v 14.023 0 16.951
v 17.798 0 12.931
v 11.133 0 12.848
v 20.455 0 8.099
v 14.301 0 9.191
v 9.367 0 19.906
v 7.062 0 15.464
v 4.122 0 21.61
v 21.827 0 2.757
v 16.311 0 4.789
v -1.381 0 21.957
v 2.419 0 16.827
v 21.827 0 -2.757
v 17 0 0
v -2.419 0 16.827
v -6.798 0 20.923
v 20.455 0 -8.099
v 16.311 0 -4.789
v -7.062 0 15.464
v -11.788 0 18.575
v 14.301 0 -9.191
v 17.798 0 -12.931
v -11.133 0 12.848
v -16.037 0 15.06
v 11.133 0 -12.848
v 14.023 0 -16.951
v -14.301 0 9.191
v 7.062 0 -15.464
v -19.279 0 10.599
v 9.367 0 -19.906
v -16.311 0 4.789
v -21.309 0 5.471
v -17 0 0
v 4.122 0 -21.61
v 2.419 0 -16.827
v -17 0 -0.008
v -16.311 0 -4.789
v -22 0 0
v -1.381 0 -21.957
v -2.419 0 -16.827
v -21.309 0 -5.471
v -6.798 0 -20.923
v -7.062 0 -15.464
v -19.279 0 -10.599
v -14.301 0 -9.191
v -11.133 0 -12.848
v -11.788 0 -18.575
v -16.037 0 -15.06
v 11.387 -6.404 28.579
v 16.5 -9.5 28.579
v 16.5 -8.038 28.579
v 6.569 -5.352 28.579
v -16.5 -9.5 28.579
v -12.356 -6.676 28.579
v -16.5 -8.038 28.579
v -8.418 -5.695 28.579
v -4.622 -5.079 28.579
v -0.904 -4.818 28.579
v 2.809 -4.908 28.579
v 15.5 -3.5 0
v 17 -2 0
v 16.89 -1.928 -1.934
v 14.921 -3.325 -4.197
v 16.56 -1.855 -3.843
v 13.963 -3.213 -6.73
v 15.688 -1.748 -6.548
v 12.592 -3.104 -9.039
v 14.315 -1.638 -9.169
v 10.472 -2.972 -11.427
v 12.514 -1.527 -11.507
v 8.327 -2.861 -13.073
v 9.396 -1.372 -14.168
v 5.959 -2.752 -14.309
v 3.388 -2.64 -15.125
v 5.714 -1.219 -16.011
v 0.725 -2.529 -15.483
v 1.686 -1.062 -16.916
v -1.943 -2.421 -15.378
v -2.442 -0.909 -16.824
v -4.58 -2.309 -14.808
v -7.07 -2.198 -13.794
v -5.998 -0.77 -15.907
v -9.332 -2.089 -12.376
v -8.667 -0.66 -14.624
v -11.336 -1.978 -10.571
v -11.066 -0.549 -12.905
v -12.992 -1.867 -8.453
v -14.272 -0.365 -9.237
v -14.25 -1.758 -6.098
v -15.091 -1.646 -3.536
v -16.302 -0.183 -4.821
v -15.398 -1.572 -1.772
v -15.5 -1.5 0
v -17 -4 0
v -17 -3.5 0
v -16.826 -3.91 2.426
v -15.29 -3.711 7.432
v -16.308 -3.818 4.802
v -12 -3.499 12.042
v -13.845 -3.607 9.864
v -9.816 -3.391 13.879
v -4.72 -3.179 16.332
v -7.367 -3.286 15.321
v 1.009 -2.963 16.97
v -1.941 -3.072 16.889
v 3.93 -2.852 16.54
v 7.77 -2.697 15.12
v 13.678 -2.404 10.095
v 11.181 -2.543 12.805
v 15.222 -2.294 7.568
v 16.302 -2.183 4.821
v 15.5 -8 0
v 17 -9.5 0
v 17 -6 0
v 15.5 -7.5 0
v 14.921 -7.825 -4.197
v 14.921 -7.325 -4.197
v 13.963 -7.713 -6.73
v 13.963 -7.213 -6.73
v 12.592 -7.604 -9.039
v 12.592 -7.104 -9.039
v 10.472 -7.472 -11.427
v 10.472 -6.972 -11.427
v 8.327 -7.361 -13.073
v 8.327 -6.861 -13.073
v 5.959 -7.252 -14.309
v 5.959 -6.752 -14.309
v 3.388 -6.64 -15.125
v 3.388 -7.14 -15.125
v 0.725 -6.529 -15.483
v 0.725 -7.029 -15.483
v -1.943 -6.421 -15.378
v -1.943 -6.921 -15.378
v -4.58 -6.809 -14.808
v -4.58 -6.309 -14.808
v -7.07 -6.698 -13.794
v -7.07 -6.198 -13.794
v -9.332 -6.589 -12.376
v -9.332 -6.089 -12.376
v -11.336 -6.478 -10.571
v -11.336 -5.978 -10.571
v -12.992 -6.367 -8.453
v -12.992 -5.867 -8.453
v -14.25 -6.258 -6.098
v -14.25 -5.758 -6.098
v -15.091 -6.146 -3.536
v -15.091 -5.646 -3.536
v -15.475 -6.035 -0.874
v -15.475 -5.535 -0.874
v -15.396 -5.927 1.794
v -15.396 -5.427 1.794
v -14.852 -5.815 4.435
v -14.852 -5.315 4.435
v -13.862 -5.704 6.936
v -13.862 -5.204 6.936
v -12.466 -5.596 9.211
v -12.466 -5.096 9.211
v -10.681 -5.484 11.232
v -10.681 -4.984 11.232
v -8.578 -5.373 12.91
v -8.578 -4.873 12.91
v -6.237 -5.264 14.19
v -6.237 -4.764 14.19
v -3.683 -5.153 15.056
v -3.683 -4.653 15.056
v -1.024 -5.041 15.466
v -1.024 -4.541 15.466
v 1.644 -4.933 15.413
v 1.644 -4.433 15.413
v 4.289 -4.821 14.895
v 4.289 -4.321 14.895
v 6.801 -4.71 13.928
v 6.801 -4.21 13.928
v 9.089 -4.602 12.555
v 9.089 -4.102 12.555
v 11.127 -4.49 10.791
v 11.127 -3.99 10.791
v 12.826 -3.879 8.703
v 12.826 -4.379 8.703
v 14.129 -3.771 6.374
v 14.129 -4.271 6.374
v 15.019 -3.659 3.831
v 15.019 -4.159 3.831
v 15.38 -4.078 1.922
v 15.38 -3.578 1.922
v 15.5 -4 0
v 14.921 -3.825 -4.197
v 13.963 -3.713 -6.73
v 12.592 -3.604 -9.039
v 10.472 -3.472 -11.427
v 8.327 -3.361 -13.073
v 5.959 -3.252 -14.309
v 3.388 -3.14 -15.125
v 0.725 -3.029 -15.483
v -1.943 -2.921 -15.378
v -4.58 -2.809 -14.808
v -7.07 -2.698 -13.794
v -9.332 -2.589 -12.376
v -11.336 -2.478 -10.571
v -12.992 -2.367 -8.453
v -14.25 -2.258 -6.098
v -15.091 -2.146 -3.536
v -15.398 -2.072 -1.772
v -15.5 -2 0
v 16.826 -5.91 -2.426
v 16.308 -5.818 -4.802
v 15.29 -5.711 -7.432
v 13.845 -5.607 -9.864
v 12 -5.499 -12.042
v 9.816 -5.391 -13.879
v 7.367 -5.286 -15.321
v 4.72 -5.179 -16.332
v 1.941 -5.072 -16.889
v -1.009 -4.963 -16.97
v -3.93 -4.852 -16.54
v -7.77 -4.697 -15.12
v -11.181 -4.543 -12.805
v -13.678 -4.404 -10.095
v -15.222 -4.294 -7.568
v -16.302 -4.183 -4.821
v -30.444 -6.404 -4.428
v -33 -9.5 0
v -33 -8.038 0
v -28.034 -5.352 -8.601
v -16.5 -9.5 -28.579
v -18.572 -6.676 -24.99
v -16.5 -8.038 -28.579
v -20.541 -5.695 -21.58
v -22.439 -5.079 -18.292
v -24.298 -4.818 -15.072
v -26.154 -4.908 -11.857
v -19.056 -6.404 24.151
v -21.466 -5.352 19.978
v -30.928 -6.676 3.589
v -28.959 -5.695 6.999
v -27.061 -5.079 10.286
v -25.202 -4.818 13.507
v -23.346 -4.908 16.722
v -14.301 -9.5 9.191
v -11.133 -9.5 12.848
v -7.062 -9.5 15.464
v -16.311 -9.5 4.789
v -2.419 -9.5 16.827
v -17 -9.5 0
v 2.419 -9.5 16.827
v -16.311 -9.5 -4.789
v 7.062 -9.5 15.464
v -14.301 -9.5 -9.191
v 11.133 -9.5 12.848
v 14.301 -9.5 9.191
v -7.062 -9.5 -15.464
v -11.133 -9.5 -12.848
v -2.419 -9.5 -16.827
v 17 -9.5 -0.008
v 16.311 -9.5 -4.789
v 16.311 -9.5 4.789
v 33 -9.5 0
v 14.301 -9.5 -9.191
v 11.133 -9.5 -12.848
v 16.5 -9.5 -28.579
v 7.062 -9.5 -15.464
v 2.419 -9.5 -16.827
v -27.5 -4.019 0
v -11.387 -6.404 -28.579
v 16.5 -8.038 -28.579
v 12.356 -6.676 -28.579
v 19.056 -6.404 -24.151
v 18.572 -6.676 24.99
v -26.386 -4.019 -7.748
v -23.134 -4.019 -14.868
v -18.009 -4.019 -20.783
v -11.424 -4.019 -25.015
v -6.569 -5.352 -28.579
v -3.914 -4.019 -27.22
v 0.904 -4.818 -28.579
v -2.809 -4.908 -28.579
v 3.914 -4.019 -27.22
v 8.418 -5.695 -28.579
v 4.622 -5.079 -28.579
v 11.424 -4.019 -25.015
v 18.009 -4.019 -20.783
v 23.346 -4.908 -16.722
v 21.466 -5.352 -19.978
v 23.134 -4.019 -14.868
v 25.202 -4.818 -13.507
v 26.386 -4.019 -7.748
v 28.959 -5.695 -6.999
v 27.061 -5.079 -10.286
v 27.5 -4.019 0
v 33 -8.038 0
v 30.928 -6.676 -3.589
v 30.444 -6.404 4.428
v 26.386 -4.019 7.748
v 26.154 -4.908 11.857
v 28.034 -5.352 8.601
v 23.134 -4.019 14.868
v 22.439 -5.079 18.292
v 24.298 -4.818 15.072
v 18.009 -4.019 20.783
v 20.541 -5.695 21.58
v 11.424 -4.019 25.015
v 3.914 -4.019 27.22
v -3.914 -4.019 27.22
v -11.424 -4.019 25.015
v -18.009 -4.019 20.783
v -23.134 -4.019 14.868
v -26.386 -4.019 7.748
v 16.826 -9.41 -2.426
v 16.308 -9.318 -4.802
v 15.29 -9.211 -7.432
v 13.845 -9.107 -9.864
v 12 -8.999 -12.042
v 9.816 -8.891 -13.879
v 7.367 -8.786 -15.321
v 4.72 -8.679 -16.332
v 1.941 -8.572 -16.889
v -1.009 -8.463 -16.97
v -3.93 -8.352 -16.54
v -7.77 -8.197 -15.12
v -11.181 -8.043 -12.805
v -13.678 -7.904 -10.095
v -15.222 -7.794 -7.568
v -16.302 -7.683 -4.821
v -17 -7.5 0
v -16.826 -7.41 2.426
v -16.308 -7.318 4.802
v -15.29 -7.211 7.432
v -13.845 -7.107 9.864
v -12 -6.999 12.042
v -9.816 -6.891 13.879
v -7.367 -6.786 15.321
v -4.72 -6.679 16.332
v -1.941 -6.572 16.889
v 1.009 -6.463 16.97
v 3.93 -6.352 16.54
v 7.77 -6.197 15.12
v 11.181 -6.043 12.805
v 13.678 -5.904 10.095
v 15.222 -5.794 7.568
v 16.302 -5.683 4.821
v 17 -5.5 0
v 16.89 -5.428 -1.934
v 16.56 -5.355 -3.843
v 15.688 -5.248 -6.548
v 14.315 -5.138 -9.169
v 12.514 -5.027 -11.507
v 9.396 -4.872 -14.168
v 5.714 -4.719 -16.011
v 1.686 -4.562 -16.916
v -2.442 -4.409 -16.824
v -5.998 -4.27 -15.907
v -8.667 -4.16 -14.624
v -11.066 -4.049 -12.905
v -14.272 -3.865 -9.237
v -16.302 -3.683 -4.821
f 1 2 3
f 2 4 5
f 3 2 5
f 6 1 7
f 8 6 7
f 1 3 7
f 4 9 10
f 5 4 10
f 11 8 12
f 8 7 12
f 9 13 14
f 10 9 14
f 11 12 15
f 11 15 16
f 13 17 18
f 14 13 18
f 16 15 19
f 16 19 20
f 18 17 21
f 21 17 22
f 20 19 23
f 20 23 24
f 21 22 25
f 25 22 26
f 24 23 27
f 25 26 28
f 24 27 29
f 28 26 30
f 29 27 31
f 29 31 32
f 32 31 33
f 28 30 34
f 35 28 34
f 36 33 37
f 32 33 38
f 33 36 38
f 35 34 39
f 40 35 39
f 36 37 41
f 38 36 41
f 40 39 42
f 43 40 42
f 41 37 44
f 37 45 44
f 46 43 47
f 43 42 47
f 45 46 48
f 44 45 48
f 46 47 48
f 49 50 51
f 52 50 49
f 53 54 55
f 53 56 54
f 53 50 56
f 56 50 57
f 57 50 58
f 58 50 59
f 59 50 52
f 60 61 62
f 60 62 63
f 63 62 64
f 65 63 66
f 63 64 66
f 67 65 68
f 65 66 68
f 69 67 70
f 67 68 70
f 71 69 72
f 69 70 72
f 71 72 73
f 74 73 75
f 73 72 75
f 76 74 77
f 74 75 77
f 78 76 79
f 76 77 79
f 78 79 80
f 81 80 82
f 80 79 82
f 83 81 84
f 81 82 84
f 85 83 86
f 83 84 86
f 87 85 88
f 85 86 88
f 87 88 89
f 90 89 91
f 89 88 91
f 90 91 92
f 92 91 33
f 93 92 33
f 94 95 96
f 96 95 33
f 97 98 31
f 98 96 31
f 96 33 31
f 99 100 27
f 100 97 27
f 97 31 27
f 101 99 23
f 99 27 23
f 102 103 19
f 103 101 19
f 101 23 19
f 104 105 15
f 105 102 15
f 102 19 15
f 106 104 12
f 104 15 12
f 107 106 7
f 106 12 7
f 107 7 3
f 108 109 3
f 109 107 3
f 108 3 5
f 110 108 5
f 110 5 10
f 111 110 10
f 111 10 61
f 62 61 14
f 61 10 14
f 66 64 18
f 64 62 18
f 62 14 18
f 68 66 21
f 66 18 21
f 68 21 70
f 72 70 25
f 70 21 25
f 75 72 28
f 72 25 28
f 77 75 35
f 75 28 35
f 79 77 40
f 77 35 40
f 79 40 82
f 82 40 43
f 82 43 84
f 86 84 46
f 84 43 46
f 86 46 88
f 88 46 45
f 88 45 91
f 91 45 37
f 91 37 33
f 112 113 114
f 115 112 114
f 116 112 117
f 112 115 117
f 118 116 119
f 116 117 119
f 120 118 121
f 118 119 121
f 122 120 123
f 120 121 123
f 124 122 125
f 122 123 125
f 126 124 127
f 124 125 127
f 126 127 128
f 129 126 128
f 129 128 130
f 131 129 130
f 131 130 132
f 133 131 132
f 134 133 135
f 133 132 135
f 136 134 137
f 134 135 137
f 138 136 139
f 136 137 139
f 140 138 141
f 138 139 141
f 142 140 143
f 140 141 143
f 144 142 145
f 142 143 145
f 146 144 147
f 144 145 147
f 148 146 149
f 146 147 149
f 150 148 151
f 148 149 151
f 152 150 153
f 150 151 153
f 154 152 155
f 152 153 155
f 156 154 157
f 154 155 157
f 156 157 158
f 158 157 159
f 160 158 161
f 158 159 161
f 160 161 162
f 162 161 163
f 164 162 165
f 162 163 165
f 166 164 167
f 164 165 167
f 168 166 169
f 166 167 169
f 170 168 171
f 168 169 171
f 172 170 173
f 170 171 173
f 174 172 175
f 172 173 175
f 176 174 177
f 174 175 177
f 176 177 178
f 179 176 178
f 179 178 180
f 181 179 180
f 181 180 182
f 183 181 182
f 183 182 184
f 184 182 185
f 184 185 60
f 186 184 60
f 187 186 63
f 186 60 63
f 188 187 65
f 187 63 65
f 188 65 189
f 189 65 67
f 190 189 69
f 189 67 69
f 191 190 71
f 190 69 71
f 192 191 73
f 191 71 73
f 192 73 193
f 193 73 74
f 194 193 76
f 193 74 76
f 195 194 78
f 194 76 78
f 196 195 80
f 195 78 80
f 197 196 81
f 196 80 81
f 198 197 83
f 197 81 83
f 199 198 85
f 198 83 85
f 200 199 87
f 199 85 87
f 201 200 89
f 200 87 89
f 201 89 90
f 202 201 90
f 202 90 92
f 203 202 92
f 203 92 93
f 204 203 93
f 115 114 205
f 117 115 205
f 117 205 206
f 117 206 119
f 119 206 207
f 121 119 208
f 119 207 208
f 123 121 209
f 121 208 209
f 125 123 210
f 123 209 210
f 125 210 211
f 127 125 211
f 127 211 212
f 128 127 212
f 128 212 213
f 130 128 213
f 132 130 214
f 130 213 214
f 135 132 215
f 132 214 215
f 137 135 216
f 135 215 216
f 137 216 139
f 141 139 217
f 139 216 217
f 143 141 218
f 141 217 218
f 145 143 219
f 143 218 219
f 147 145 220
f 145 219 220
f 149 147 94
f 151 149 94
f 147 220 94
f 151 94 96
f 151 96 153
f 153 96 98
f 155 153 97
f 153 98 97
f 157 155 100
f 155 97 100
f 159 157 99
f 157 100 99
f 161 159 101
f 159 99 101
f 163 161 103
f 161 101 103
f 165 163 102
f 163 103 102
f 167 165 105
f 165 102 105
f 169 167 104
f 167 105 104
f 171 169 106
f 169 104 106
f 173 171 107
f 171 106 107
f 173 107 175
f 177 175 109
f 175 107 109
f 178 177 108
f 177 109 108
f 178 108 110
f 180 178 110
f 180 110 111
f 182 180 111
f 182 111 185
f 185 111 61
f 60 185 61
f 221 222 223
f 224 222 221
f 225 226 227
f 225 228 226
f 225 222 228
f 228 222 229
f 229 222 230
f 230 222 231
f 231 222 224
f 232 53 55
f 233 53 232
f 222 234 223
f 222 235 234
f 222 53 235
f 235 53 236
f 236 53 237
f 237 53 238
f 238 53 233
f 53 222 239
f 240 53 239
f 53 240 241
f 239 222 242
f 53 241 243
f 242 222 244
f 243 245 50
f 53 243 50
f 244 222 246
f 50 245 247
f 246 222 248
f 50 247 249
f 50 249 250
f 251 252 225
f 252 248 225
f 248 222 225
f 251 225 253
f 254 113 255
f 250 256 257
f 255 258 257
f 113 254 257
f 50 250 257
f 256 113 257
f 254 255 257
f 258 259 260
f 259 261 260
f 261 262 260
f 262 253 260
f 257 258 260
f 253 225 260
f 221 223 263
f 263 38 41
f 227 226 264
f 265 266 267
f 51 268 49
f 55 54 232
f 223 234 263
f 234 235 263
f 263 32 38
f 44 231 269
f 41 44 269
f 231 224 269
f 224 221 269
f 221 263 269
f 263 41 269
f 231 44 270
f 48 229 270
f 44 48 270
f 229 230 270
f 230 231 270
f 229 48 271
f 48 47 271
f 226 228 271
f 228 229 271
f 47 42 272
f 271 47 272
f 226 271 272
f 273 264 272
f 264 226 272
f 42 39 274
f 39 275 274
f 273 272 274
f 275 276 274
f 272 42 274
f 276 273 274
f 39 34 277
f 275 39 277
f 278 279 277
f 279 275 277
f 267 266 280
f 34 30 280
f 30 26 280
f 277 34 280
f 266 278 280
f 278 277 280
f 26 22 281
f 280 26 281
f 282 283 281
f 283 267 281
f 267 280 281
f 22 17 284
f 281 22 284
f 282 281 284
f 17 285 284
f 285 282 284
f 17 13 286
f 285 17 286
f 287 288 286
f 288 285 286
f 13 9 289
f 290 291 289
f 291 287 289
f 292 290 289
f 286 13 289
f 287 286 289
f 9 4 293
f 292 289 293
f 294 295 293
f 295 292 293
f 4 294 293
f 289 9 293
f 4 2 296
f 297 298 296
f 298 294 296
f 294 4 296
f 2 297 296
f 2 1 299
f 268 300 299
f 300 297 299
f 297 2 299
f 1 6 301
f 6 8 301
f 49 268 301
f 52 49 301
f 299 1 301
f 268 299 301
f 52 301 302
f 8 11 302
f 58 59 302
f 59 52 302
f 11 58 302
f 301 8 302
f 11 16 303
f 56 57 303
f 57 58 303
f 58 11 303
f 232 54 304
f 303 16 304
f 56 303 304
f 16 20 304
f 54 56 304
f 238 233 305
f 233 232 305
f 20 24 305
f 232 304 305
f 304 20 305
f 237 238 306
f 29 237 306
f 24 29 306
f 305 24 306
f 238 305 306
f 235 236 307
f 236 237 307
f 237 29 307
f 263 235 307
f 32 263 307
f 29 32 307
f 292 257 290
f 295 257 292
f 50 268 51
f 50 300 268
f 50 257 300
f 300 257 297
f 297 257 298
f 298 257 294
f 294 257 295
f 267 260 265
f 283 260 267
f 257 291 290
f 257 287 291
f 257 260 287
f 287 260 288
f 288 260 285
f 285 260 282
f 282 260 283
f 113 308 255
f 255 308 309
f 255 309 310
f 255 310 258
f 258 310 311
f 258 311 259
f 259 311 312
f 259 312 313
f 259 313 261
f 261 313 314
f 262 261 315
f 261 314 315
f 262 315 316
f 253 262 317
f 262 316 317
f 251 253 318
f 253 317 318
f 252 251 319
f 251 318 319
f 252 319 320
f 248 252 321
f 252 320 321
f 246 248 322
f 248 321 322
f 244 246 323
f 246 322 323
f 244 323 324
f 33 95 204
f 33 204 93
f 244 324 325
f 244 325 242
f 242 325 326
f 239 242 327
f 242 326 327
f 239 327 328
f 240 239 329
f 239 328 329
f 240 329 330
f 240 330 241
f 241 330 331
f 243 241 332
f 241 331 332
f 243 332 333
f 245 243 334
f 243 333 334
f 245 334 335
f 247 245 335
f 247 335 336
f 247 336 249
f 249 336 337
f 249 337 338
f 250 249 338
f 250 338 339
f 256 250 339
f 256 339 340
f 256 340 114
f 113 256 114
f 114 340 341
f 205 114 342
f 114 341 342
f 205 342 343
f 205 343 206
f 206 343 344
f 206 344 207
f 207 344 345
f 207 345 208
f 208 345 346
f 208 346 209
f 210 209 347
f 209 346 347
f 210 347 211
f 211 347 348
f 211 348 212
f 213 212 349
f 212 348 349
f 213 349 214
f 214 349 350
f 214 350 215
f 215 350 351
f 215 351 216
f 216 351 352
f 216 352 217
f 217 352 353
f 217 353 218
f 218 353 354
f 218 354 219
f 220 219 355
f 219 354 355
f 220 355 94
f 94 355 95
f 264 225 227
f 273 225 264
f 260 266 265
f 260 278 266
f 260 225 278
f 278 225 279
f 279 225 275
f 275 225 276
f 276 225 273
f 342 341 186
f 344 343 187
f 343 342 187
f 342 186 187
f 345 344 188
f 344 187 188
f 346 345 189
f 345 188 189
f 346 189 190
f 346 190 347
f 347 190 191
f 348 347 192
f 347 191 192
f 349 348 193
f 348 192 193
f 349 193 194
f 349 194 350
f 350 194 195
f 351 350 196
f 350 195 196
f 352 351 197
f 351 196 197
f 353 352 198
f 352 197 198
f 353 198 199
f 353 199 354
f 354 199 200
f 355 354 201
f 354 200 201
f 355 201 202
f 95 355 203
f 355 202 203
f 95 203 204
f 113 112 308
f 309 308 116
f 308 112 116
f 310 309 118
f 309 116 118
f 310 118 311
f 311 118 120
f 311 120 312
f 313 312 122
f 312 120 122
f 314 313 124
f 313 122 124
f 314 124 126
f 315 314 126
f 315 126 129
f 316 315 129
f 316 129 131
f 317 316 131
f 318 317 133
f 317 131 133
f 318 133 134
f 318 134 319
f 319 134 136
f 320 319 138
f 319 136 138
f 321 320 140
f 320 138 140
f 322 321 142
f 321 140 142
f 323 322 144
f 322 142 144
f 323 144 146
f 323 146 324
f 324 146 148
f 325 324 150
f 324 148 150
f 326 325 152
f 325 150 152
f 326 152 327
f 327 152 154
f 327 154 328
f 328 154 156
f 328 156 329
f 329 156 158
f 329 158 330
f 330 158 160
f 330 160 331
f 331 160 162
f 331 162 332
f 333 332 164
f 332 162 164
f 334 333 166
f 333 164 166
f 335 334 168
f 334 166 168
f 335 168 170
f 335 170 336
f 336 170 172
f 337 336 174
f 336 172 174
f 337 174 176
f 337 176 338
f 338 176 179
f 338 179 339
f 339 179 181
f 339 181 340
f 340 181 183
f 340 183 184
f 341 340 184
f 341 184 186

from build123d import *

# Parameters (mm, degrees)
SKETCH_4_R          = 17
CUT_EXTRUDE_2_DEPTH = 10
SWEEP_1_PITCH       = 4
SKETCH_12_W         = 1
SKETCH_12_H         = 0.730769231
SKETCH_13_R         = 34
CUT_EXTRUDE_3_DEPTH = 10


with BuildPart() as part:
    # 草图1 → 旋转1 (revolve)
    with BuildSketch(Plane.XY):
        Polygon((0, 0), (0, -9.5), (-35, -9.5), (-22, 0), align=None)
    revolve(axis=Axis((0, 0, 0), (0, -1, 0)))

    # 草图4 → 切除-拉伸2 (cut)
    with BuildSketch(Plane(origin=(0, 0, 0), x_dir=(1, 0, 0), z_dir=(0, 1, 0))):
        with Locations(Location((0, 0, 0), (0, 0, 180))):
            Circle(SKETCH_4_R)
    extrude(amount=-CUT_EXTRUDE_2_DEPTH, mode=Mode.SUBTRACT)

    # 扫描1: the profile of 草图7 profile screwed along a right-hand helix of 1.5 turns, 12 arcs to a turn; built about Z, then put on its axis
    sweep_1_z = Axis((0, 0, 0), (0, 0, 1))
    sweep_1_corners = [(17.0003, 0, 1.7503), (17.0003, 0, -1.7503), (15.5, 0, -0.25), (15.5, 0, 0.25)]
    with BuildLine(mode=Mode.PRIVATE) as sweep_1_profile:
        Line(sweep_1_corners[0], sweep_1_corners[1])
        Line(sweep_1_corners[1], sweep_1_corners[2])
        Line(sweep_1_corners[2], sweep_1_corners[3])
        Line(sweep_1_corners[3], sweep_1_corners[0])
    sweep_1_cap = Face(sweep_1_profile.wire())
    sweep_1_turn_angles = [0, 15, 30, 45, 60, 75, 90, 105, 120, 135, 150, 165, 180, 195, 210, 225, 240, 255, 270, 285, 300, 315, 330, 345, 360]
    sweep_1_turn_weights = [1, 0.9659258262890683, 1, 0.9659258262890683, 1, 0.9659258262890683, 1, 0.9659258262890683, 1, 0.9659258262890683, 1, 0.9659258262890683, 1, 0.9659258262890683, 1, 0.9659258262890683, 1, 0.9659258262890683, 1, 0.9659258262890683, 1, 0.9659258262890683, 1, 0.9659258262890683, 1]
    sweep_1_turn_rails = [Edge.make_bspline([Vector(p[0], p[1], 0).rotate(sweep_1_z, sweep_1_turn_angles[k]) / sweep_1_turn_weights[k] + Vector(0, 0, p[2] + SWEEP_1_PITCH * sweep_1_turn_angles[k] / 360) for k in range(25)], [0, 0, 0, 1, 1, 2, 2, 3, 3, 4, 4, 5, 5, 6, 6, 7, 7, 8, 8, 9, 9, 10, 10, 11, 11, 12, 12, 12], 2, sweep_1_turn_weights) for p in sweep_1_corners]
    sweep_1_turn_sides = [Face.make_surface_from_curves(sweep_1_turn_rails[p[0]], sweep_1_turn_rails[p[1]]) for p in [(0, 1), (1, 2), (2, 3), (3, 0)]]
    sweep_1_last_angles = [360, 375, 390, 405, 420, 435, 450, 465, 480, 495, 510, 525, 540]
    sweep_1_last_weights = [1, 0.9659258262890683, 1, 0.9659258262890683, 1, 0.9659258262890683, 1, 0.9659258262890683, 1, 0.9659258262890683, 1, 0.965925826289065, 1]
    sweep_1_last_rails = [Edge.make_bspline([Vector(p[0], p[1], 0).rotate(sweep_1_z, sweep_1_last_angles[k]) / sweep_1_last_weights[k] + Vector(0, 0, p[2] + SWEEP_1_PITCH * sweep_1_last_angles[k] / 360) for k in range(13)], [0, 0, 0, 1, 1, 2, 2, 3, 3, 4, 4, 5, 5, 6, 6, 6], 2, sweep_1_last_weights) for p in sweep_1_corners]
    sweep_1_last_sides = [Face.make_surface_from_curves(sweep_1_last_rails[p[0]], sweep_1_last_rails[p[1]]) for p in [(0, 1), (1, 2), (2, 3), (3, 0)]]
    sweep_1 = Plane(origin=(0, -7.75, 0), x_dir=(1, 0, 0), z_dir=(0, 1, 0)) * Solid(Shell([*sweep_1_turn_sides, *sweep_1_last_sides, sweep_1_cap, sweep_1_cap.rotate(sweep_1_z, 540).moved(Location((0, 0, SWEEP_1_PITCH * 540 / 360)))]))
    add(sweep_1)

    # 草图12 → 切除-旋转4 (revolve, cut)
    with BuildSketch(Plane(origin=(0, 0, 0), x_dir=(0, 0, -1), z_dir=(1, 0, 0)), mode=Mode.PRIVATE) as cut_revolve_4_sk:
        with Locations((-34.5, -9.134615384)):
            Rectangle(SKETCH_12_W, SKETCH_12_H)
    revolve(cut_revolve_4_sk.sketch.rotate(Axis((0, 0, 0), (0, 1, 0)), 180), axis=Axis((0, 0, 0), (0, 1, 0)), mode=Mode.SUBTRACT)

    # 草图13 → 切除-拉伸3 (cut)
    with BuildSketch(Plane.XZ.offset(9.5)):
        Circle(SKETCH_13_R)
        Polygon((-33, 0), (-16.5, -28.578838325), (16.5, -28.578838325), (33, 0), (16.5, 28.578838325), (-16.5, 28.578838325), align=None, mode=Mode.SUBTRACT)
    extrude(amount=-CUT_EXTRUDE_3_DEPTH, mode=Mode.SUBTRACT)


solid = part.part
